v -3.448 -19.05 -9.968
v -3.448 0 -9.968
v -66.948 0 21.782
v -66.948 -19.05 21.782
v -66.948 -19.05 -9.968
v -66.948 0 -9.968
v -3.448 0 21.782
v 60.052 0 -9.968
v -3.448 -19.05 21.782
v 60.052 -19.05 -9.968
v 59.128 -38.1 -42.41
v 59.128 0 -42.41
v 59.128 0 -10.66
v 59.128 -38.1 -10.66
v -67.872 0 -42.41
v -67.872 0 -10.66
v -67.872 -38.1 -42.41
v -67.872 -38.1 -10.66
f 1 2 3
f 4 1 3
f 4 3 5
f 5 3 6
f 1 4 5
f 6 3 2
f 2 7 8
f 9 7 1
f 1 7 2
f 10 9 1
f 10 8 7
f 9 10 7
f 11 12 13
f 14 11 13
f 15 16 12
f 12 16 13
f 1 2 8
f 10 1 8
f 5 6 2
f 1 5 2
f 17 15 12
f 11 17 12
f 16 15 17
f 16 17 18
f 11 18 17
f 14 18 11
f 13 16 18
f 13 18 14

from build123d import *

# Parameters (mm, degrees)
F0_W     = 127
F0_H     = 31.75
F1_DEPTH = 38.1
F3_DEPTH = 19.05


with BuildPart() as f1:
    # F0 (on Front) → F1 (new body)
    with BuildSketch(Plane.XZ):
        with Locations((-4.372131, -26.53467)):
            Rectangle(F0_W, F0_H)
    extrude(amount=F1_DEPTH)


with BuildPart() as f3:
    # F2 (on Front) → F3 (new body)
    with BuildSketch(Plane.XZ):
        Polygon((-3.447766, 21.782044), (-3.447766, -9.967956), (60.052234, -9.967956), align=None)
        Polygon((-66.947766, 21.782044), (-66.947766, -9.967956), (-3.447766, -9.967956), align=None)
    extrude(amount=F3_DEPTH)


solid = Compound([f1.part, f3.part])
